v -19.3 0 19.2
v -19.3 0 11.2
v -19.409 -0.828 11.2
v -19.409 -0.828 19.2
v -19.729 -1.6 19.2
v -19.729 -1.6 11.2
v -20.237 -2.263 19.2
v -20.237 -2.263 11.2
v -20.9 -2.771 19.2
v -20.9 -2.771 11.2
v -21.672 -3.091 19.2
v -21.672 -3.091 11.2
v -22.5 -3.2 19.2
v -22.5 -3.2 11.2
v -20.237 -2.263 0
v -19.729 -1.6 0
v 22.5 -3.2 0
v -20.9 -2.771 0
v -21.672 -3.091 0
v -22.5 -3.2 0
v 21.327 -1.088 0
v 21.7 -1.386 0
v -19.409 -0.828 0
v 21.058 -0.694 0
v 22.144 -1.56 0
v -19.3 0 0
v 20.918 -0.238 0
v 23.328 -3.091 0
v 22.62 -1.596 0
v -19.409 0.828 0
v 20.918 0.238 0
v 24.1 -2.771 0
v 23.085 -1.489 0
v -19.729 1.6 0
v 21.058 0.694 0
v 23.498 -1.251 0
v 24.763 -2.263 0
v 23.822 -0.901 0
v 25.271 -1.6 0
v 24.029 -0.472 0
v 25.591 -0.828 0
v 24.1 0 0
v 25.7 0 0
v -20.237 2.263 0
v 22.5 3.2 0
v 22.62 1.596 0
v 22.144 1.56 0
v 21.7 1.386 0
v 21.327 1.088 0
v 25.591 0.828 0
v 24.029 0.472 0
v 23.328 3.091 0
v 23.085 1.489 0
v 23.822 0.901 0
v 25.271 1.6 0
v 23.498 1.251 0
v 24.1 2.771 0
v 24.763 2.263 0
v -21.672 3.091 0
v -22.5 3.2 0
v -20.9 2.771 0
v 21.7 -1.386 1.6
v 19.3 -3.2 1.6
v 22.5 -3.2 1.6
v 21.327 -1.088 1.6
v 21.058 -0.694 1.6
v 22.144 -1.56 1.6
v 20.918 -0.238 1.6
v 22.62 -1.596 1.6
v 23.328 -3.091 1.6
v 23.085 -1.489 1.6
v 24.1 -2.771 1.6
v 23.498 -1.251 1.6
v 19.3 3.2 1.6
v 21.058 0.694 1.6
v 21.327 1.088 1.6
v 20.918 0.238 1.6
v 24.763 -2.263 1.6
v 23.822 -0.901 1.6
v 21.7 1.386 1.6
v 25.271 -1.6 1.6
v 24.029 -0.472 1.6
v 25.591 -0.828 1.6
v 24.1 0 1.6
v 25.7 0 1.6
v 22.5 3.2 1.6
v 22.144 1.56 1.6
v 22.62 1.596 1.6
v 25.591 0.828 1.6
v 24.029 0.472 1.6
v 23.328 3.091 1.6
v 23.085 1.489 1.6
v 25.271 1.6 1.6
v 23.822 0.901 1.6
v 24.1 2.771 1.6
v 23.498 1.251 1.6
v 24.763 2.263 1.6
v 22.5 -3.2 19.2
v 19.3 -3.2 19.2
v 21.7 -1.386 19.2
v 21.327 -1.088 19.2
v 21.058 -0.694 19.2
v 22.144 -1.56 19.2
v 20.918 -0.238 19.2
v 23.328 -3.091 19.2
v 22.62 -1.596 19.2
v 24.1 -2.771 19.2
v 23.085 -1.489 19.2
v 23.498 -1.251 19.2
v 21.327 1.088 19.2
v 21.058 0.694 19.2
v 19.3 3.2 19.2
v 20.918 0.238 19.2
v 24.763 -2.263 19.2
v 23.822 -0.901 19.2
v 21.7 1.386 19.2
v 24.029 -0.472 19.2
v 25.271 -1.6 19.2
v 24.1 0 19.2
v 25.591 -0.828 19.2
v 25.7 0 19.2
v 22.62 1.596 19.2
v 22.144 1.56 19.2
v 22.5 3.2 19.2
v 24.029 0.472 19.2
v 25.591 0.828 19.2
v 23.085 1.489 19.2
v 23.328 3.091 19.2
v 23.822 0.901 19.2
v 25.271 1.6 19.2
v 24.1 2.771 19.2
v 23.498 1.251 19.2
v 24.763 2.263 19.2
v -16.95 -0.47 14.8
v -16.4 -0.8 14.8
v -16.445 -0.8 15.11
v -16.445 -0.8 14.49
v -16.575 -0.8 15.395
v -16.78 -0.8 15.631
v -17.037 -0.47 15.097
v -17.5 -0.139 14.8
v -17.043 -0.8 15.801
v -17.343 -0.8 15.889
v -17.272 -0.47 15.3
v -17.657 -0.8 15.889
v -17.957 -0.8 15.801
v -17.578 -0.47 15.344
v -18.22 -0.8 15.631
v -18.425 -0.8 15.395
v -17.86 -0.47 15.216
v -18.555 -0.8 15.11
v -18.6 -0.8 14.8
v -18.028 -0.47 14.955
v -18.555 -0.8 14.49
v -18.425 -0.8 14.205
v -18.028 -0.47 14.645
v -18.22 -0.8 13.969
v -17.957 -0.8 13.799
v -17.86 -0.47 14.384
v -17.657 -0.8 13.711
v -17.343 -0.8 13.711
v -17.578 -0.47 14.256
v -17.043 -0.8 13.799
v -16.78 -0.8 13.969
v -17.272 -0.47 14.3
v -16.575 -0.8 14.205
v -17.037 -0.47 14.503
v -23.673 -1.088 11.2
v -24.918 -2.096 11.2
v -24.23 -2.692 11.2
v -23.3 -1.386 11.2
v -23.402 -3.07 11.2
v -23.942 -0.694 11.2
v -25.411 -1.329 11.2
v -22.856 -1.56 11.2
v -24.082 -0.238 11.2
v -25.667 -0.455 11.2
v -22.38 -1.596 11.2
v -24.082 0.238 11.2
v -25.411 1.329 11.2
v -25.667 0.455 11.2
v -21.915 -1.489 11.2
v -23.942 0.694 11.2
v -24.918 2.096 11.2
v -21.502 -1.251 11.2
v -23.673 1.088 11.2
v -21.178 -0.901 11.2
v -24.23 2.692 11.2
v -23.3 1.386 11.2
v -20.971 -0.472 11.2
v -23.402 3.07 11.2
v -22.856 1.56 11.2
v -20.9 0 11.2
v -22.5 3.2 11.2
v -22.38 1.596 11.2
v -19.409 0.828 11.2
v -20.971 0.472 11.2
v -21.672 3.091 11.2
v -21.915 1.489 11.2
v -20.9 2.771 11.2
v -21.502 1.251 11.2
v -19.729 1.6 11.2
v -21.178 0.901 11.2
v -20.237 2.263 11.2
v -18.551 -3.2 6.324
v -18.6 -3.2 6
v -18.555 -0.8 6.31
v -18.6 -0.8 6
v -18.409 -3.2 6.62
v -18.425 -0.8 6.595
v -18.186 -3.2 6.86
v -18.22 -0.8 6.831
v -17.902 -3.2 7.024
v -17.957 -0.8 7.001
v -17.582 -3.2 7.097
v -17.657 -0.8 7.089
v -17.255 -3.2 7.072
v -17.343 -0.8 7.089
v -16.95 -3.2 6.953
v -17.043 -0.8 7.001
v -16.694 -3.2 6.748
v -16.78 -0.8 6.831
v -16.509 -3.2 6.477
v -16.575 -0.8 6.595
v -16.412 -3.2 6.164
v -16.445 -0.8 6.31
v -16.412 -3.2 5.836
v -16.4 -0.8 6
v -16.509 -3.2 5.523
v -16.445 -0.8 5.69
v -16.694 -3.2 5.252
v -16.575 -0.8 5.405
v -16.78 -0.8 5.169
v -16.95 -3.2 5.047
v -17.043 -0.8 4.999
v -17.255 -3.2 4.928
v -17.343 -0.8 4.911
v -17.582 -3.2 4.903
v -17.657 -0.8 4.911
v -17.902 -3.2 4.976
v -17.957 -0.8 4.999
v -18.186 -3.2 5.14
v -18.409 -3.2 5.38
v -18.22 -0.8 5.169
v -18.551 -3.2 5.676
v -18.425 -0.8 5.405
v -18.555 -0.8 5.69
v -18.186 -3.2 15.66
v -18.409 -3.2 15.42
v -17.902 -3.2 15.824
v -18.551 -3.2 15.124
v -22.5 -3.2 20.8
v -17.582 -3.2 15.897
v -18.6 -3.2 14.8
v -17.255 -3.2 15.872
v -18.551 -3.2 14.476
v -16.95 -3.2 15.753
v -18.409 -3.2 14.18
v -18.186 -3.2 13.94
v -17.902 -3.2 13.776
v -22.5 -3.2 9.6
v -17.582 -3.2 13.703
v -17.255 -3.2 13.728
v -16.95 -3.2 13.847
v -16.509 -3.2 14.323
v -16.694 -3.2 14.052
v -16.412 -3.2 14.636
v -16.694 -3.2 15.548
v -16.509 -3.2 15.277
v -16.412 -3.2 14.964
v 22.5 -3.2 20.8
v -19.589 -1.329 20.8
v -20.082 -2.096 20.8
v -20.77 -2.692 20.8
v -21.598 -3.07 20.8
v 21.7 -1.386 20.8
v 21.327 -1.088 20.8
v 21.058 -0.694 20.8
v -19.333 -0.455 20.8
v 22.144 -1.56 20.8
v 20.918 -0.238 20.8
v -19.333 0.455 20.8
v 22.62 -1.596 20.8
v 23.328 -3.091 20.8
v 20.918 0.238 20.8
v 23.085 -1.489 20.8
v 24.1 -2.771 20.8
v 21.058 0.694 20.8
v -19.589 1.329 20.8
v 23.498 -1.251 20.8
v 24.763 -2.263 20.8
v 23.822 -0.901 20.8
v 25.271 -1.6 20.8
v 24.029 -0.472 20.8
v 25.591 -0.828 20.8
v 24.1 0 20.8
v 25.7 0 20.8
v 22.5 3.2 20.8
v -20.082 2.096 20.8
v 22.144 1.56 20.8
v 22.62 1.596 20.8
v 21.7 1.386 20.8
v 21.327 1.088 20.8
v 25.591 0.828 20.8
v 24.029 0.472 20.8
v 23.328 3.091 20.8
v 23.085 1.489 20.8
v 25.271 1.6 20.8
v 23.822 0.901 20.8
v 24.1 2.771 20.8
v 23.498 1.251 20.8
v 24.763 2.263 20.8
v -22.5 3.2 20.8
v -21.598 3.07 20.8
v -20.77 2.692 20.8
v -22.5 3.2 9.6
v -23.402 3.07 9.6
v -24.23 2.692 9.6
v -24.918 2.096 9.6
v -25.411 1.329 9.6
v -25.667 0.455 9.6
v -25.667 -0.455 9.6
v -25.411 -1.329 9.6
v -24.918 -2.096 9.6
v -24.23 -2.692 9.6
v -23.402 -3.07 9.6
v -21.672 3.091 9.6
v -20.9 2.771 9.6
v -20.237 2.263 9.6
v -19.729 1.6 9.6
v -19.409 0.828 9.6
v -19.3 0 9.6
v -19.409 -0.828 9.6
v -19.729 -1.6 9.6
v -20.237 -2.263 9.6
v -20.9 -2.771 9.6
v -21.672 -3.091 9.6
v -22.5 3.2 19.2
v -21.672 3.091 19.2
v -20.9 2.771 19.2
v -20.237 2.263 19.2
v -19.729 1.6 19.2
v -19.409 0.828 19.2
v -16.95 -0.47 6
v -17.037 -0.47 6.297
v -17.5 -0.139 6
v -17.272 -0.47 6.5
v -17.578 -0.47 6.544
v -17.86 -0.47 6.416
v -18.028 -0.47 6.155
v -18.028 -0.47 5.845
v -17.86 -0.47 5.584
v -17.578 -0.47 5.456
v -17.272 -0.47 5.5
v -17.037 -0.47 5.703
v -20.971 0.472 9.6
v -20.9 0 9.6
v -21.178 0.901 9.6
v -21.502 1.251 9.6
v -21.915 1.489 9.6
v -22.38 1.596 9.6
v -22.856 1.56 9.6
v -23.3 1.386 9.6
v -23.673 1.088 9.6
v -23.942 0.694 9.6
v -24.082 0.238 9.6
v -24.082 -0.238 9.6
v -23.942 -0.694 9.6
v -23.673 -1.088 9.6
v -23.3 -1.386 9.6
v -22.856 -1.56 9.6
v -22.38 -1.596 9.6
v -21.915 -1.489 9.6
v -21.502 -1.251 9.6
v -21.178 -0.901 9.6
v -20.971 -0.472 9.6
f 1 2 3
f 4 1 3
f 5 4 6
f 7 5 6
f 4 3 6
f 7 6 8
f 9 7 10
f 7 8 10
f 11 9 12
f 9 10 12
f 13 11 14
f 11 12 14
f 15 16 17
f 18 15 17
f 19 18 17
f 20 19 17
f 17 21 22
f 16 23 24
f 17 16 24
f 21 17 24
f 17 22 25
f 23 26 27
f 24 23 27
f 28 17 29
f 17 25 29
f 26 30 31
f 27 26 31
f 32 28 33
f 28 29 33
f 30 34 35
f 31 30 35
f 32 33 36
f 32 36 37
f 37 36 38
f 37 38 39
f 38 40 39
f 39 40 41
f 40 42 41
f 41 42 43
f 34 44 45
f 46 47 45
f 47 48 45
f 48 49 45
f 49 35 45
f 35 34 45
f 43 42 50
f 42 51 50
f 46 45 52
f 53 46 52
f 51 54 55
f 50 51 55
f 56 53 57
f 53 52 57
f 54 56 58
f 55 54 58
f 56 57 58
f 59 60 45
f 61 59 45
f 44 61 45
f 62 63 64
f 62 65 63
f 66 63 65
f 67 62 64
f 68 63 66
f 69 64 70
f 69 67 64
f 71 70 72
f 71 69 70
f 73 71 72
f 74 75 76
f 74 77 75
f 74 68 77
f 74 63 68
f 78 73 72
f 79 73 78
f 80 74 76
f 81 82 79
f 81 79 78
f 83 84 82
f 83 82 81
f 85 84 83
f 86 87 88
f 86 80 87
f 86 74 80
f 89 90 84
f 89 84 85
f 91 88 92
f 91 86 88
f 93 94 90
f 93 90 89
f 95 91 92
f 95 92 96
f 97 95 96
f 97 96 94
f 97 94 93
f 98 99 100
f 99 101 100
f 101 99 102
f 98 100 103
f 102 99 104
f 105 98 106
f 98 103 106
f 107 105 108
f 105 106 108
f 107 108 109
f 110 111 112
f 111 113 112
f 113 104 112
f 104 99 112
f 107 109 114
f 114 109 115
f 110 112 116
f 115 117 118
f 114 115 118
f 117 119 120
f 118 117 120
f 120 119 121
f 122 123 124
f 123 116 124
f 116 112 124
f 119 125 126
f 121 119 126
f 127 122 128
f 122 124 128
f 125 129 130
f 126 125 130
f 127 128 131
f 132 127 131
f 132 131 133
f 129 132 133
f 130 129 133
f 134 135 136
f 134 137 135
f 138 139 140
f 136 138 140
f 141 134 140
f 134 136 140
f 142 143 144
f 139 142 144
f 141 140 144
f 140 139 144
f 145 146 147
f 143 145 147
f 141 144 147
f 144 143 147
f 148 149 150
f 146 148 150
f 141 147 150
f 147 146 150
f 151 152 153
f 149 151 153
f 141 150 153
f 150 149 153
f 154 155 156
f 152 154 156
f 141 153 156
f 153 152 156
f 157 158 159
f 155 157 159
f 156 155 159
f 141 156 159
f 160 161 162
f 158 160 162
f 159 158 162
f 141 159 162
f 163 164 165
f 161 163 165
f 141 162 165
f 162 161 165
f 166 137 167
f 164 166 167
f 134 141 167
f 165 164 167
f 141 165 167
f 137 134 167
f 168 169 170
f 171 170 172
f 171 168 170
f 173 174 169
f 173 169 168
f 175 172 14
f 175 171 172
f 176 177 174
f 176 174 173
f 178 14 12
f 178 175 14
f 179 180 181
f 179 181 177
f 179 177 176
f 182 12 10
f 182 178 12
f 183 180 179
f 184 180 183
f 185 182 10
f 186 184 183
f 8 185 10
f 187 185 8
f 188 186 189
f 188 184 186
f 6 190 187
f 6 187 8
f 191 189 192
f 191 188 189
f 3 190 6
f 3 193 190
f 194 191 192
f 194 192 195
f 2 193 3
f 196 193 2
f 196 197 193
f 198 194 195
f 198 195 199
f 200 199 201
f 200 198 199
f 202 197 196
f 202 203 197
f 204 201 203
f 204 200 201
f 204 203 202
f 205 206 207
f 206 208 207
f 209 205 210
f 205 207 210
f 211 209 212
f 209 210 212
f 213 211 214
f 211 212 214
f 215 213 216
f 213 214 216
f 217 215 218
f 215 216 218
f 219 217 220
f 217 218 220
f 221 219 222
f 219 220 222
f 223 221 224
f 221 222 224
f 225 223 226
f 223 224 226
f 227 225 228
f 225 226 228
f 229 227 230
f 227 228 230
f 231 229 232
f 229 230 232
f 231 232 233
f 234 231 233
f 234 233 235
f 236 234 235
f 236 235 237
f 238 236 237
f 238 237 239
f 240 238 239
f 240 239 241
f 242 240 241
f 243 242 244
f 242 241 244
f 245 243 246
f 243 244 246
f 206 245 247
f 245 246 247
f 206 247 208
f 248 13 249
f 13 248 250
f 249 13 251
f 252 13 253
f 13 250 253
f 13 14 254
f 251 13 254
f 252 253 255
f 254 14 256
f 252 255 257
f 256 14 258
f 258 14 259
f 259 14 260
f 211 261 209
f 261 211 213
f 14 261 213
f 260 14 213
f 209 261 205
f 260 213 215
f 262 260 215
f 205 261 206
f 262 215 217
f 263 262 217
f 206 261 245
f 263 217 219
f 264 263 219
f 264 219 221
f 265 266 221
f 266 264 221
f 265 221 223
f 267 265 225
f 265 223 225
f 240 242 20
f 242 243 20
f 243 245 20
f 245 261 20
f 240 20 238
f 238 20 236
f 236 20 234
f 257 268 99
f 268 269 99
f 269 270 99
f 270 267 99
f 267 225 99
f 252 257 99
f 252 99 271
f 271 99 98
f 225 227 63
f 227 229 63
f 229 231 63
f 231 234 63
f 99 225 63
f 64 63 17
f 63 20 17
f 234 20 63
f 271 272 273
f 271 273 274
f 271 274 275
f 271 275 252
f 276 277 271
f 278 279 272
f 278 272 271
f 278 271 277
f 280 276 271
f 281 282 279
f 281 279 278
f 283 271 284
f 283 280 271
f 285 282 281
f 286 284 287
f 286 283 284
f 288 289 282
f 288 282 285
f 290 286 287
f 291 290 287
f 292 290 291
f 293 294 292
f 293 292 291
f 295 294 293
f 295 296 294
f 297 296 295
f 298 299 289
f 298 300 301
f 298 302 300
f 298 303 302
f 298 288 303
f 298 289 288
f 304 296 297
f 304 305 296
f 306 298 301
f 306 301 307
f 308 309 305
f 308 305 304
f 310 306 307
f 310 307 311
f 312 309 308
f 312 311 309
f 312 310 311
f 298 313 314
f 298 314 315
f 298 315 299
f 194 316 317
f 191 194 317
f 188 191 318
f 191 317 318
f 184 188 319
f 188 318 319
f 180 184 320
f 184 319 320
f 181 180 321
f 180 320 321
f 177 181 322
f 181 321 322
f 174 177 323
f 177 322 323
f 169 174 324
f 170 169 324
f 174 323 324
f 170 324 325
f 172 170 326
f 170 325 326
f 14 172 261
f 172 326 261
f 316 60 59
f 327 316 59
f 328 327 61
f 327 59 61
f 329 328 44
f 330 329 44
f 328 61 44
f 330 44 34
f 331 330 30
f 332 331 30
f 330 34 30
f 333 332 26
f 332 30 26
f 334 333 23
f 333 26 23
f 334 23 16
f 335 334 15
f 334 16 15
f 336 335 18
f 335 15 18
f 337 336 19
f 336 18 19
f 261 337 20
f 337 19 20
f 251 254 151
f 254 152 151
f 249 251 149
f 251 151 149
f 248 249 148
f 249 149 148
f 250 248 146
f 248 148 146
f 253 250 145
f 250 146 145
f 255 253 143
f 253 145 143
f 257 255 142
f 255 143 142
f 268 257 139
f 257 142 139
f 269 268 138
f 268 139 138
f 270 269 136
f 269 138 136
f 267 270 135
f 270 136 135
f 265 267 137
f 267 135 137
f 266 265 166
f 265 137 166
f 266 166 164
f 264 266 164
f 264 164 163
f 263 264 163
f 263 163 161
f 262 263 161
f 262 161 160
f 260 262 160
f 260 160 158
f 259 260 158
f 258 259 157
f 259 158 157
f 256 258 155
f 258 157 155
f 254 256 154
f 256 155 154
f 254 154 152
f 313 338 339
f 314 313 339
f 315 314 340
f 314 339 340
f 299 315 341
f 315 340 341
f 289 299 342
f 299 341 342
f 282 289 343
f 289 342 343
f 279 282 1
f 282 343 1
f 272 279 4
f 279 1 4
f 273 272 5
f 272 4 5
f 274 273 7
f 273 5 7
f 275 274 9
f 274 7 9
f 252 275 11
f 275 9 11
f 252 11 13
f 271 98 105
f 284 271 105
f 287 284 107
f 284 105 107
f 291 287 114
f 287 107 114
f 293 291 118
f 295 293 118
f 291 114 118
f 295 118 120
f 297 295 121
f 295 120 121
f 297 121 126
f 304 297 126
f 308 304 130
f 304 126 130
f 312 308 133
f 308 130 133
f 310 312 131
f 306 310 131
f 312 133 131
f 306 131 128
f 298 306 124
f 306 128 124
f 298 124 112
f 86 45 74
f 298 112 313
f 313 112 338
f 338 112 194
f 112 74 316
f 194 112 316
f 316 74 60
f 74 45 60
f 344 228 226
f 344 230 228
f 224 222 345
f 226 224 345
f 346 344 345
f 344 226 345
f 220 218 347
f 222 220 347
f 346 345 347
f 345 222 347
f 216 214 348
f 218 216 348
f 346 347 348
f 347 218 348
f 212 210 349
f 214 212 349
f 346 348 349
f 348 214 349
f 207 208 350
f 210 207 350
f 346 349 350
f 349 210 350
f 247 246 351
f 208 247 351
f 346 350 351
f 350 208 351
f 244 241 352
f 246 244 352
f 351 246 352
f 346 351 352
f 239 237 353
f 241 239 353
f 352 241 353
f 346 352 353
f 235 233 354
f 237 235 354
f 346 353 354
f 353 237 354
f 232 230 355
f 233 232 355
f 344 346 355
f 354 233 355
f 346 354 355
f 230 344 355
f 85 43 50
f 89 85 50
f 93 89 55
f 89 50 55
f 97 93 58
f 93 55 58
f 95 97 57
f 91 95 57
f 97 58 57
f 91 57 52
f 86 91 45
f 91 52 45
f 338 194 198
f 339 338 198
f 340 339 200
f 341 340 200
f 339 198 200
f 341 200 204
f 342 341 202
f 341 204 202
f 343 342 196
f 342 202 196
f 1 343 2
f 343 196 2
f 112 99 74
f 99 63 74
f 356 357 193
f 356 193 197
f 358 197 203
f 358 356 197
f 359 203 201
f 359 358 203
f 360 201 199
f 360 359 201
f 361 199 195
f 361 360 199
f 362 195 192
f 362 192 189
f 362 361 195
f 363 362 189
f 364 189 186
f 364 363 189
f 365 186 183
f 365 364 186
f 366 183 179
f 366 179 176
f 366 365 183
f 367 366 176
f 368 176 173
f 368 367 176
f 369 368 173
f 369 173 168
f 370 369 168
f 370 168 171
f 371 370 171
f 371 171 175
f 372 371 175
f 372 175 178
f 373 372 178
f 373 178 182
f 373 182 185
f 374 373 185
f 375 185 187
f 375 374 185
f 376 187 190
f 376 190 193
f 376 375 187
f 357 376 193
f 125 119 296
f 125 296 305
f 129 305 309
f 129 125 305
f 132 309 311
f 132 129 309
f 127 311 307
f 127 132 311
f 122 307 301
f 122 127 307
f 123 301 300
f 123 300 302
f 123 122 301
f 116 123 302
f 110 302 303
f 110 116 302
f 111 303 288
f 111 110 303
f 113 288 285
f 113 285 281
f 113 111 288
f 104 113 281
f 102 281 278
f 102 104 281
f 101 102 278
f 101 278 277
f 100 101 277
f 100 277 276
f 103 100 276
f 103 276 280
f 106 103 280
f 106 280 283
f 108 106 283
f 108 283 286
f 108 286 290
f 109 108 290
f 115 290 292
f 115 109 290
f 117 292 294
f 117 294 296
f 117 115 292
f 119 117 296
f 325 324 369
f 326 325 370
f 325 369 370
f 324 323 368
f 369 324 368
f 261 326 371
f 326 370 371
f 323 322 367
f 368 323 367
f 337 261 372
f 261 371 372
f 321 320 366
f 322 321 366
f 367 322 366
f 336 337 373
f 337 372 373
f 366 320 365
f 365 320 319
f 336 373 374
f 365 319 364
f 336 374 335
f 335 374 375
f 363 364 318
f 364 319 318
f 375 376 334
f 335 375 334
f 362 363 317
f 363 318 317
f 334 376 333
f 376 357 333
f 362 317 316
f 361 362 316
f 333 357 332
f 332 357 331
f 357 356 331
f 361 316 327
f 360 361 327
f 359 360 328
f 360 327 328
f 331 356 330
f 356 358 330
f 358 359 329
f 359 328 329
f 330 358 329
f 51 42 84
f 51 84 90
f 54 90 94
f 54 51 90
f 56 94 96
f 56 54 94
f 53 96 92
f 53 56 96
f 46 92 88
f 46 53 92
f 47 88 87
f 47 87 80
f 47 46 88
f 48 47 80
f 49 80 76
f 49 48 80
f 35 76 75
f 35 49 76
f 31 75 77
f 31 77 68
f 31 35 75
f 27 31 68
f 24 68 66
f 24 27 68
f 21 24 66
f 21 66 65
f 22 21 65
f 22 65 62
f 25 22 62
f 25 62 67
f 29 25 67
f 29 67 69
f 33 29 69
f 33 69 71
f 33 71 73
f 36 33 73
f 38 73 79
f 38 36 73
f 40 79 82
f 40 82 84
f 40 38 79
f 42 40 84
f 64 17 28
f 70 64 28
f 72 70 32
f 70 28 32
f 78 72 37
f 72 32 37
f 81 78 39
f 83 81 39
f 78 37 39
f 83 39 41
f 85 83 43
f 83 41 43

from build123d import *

# Parameters (mm, degrees)
F0_R      = 1.6
F1_DEPTH  = 1.6
F4_DEPTH  = 8
F5_R      = 1.6
F6_DEPTH  = 1.6
F8_DEPTH  = 8
F9_R      = 1.6
F10_DEPTH = 1.6
F12_D     = 2.2
F12_DEPTH = 2.4
F12_TIP   = 0.6609466809


with BuildPart() as f1:
    # F0 (on Top) → F1 (new body)
    with BuildSketch(Plane.XY):
        with BuildLine():
            Line((19.3, 3.2), (-22.5, 3.2))
            ThreePointArc((-22.5, 3.2), (-20.2372583002, 2.2627416998), (-19.3, 0))
            ThreePointArc((-19.3, 0), (-20.2372583002, -2.2627416998), (-22.5, -3.2))
            Line((-22.5, -3.2), (19.3, -3.2))
            Line((19.3, -3.2), (19.3, 0))
            Line((19.3, 0), (19.3, 3.2))
        make_face()
        with BuildLine():
            Line((22.5, 3.2), (19.3, 3.2))
            Line((19.3, 3.2), (19.3, 0))
            ThreePointArc((19.3, 0), (20.2372583002, 2.2627416998), (22.5, 3.2))
        make_face()
        with BuildLine():
            ThreePointArc((25.7, 0), (24.7627416998, 2.2627416998), (22.5, 3.2))
            ThreePointArc((22.5, 3.2), (20.2372583002, 2.2627416998), (19.3, 0))
            ThreePointArc((19.3, 0), (20.2372583002, -2.2627416998), (22.5, -3.2))
            ThreePointArc((22.5, -3.2), (24.7627416998, -2.2627416998), (25.7, 0))
        make_face()
        with Locations((22.5, 0)):
            Circle(F0_R, mode=Mode.SUBTRACT)
        with BuildLine():
            Line((19.3, 0), (19.3, -3.2))
            Line((19.3, -3.2), (22.5, -3.2))
            ThreePointArc((22.5, -3.2), (20.2372583002, -2.2627416998), (19.3, 0))
        make_face()
    extrude(amount=F1_DEPTH)

    # F3 (on offset) → F4 (join)
    with BuildSketch(Plane.XY.offset(1.6)):
        with BuildLine():
            ThreePointArc((-22.5, 3.2), (-20.2372583002, 2.2627416998), (-19.3, 0))
            ThreePointArc((-19.3, 0), (-20.2372583002, -2.2627416998), (-22.5, -3.2))
            Line((-22.5, -3.2), (19.3, -3.2))
            Line((19.3, -3.2), (19.3, 0))
            Line((19.3, 0), (19.3, 3.2))
            Line((19.3, 3.2), (-22.5, 3.2))
        make_face()
    extrude(amount=F4_DEPTH)

    # F5 (on face) → F6 (join)
    with BuildSketch(Plane.XY.offset(9.6)):
        with BuildLine():
            Line((-22.5, -3.2), (19.3, -3.2))
            Line((19.3, -3.2), (19.3, 3.2))
            Line((19.3, 3.2), (-22.5, 3.2))
            ThreePointArc((-22.5, 3.2), (-20.2372583002, 2.2627416998), (-19.3, 0))
            ThreePointArc((-19.3, 0), (-20.2372583002, -2.2627416998), (-22.5, -3.2))
        make_face()
        with BuildLine():
            ThreePointArc((-22.5, 3.2), (-25.7, 0), (-22.5, -3.2))
            ThreePointArc((-22.5, -3.2), (-20.2372583002, -2.2627416998), (-19.3, 0))
            ThreePointArc((-19.3, 0), (-20.2372583002, 2.2627416998), (-22.5, 3.2))
        make_face()
        with Locations((-22.5, 0)):
            Circle(F5_R, mode=Mode.SUBTRACT)
    extrude(amount=F6_DEPTH)

    # F7 (on face) → F8 (join)
    with BuildSketch(Plane.XY.offset(11.2)):
        with BuildLine():
            Line((-22.5, -3.2), (19.3, -3.2))
            Line((19.3, -3.2), (19.3, 0))
            Line((19.3, 0), (19.3, 3.2))
            Line((19.3, 3.2), (-22.5, 3.2))
            ThreePointArc((-22.5, 3.2), (-20.2372583002, 2.2627416998), (-19.3, 0))
            ThreePointArc((-19.3, 0), (-20.2372583002, -2.2627416998), (-22.5, -3.2))
        make_face()
    extrude(amount=F8_DEPTH)

    # F9 (on face) → F10 (join)
    with BuildSketch(Plane.XY.offset(19.2)):
        with BuildLine():
            Line((19.3, -3.2), (19.3, 0))
            Line((19.3, 0), (19.3, 3.2))
            Line((19.3, 3.2), (-22.5, 3.2))
            ThreePointArc((-22.5, 3.2), (-19.3, 0), (-22.5, -3.2))
            Line((-22.5, -3.2), (19.3, -3.2))
        make_face()
        with BuildLine():
            ThreePointArc((19.3, 0), (20.2372583002, 2.2627416998), (22.5, 3.2))
            Line((22.5, 3.2), (19.3, 3.2))
            Line((19.3, 3.2), (19.3, 0))
        make_face()
        with BuildLine():
            ThreePointArc((22.5, -3.2), (24.7627416998, -2.2627416998), (25.7, 0))
            ThreePointArc((25.7, 0), (24.7627416998, 2.2627416998), (22.5, 3.2))
            ThreePointArc((22.5, 3.2), (20.2372583002, 2.2627416998), (19.3, 0))
            ThreePointArc((19.3, 0), (20.2372583002, -2.2627416998), (22.5, -3.2))
        make_face()
        with Locations((22.5, 0)):
            Circle(F9_R, mode=Mode.SUBTRACT)
        with BuildLine():
            Line((19.3, -3.2), (22.5, -3.2))
            ThreePointArc((22.5, -3.2), (20.2372583002, -2.2627416998), (19.3, 0))
            Line((19.3, 0), (19.3, -3.2))
        make_face()
    extrude(amount=F10_DEPTH)

    # F12
    with Locations(Plane.XZ.offset(3.2)):
        with Locations((-17.5, 14.8), (-17.5, 6)):
            Hole(F12_D / 2, depth=F12_DEPTH)
            with Locations((0, 0, -(F12_DEPTH + F12_TIP / 2))):  # 118° drill point
                Cone(0, F12_D / 2, F12_TIP, mode=Mode.SUBTRACT)


solid = f1.part
